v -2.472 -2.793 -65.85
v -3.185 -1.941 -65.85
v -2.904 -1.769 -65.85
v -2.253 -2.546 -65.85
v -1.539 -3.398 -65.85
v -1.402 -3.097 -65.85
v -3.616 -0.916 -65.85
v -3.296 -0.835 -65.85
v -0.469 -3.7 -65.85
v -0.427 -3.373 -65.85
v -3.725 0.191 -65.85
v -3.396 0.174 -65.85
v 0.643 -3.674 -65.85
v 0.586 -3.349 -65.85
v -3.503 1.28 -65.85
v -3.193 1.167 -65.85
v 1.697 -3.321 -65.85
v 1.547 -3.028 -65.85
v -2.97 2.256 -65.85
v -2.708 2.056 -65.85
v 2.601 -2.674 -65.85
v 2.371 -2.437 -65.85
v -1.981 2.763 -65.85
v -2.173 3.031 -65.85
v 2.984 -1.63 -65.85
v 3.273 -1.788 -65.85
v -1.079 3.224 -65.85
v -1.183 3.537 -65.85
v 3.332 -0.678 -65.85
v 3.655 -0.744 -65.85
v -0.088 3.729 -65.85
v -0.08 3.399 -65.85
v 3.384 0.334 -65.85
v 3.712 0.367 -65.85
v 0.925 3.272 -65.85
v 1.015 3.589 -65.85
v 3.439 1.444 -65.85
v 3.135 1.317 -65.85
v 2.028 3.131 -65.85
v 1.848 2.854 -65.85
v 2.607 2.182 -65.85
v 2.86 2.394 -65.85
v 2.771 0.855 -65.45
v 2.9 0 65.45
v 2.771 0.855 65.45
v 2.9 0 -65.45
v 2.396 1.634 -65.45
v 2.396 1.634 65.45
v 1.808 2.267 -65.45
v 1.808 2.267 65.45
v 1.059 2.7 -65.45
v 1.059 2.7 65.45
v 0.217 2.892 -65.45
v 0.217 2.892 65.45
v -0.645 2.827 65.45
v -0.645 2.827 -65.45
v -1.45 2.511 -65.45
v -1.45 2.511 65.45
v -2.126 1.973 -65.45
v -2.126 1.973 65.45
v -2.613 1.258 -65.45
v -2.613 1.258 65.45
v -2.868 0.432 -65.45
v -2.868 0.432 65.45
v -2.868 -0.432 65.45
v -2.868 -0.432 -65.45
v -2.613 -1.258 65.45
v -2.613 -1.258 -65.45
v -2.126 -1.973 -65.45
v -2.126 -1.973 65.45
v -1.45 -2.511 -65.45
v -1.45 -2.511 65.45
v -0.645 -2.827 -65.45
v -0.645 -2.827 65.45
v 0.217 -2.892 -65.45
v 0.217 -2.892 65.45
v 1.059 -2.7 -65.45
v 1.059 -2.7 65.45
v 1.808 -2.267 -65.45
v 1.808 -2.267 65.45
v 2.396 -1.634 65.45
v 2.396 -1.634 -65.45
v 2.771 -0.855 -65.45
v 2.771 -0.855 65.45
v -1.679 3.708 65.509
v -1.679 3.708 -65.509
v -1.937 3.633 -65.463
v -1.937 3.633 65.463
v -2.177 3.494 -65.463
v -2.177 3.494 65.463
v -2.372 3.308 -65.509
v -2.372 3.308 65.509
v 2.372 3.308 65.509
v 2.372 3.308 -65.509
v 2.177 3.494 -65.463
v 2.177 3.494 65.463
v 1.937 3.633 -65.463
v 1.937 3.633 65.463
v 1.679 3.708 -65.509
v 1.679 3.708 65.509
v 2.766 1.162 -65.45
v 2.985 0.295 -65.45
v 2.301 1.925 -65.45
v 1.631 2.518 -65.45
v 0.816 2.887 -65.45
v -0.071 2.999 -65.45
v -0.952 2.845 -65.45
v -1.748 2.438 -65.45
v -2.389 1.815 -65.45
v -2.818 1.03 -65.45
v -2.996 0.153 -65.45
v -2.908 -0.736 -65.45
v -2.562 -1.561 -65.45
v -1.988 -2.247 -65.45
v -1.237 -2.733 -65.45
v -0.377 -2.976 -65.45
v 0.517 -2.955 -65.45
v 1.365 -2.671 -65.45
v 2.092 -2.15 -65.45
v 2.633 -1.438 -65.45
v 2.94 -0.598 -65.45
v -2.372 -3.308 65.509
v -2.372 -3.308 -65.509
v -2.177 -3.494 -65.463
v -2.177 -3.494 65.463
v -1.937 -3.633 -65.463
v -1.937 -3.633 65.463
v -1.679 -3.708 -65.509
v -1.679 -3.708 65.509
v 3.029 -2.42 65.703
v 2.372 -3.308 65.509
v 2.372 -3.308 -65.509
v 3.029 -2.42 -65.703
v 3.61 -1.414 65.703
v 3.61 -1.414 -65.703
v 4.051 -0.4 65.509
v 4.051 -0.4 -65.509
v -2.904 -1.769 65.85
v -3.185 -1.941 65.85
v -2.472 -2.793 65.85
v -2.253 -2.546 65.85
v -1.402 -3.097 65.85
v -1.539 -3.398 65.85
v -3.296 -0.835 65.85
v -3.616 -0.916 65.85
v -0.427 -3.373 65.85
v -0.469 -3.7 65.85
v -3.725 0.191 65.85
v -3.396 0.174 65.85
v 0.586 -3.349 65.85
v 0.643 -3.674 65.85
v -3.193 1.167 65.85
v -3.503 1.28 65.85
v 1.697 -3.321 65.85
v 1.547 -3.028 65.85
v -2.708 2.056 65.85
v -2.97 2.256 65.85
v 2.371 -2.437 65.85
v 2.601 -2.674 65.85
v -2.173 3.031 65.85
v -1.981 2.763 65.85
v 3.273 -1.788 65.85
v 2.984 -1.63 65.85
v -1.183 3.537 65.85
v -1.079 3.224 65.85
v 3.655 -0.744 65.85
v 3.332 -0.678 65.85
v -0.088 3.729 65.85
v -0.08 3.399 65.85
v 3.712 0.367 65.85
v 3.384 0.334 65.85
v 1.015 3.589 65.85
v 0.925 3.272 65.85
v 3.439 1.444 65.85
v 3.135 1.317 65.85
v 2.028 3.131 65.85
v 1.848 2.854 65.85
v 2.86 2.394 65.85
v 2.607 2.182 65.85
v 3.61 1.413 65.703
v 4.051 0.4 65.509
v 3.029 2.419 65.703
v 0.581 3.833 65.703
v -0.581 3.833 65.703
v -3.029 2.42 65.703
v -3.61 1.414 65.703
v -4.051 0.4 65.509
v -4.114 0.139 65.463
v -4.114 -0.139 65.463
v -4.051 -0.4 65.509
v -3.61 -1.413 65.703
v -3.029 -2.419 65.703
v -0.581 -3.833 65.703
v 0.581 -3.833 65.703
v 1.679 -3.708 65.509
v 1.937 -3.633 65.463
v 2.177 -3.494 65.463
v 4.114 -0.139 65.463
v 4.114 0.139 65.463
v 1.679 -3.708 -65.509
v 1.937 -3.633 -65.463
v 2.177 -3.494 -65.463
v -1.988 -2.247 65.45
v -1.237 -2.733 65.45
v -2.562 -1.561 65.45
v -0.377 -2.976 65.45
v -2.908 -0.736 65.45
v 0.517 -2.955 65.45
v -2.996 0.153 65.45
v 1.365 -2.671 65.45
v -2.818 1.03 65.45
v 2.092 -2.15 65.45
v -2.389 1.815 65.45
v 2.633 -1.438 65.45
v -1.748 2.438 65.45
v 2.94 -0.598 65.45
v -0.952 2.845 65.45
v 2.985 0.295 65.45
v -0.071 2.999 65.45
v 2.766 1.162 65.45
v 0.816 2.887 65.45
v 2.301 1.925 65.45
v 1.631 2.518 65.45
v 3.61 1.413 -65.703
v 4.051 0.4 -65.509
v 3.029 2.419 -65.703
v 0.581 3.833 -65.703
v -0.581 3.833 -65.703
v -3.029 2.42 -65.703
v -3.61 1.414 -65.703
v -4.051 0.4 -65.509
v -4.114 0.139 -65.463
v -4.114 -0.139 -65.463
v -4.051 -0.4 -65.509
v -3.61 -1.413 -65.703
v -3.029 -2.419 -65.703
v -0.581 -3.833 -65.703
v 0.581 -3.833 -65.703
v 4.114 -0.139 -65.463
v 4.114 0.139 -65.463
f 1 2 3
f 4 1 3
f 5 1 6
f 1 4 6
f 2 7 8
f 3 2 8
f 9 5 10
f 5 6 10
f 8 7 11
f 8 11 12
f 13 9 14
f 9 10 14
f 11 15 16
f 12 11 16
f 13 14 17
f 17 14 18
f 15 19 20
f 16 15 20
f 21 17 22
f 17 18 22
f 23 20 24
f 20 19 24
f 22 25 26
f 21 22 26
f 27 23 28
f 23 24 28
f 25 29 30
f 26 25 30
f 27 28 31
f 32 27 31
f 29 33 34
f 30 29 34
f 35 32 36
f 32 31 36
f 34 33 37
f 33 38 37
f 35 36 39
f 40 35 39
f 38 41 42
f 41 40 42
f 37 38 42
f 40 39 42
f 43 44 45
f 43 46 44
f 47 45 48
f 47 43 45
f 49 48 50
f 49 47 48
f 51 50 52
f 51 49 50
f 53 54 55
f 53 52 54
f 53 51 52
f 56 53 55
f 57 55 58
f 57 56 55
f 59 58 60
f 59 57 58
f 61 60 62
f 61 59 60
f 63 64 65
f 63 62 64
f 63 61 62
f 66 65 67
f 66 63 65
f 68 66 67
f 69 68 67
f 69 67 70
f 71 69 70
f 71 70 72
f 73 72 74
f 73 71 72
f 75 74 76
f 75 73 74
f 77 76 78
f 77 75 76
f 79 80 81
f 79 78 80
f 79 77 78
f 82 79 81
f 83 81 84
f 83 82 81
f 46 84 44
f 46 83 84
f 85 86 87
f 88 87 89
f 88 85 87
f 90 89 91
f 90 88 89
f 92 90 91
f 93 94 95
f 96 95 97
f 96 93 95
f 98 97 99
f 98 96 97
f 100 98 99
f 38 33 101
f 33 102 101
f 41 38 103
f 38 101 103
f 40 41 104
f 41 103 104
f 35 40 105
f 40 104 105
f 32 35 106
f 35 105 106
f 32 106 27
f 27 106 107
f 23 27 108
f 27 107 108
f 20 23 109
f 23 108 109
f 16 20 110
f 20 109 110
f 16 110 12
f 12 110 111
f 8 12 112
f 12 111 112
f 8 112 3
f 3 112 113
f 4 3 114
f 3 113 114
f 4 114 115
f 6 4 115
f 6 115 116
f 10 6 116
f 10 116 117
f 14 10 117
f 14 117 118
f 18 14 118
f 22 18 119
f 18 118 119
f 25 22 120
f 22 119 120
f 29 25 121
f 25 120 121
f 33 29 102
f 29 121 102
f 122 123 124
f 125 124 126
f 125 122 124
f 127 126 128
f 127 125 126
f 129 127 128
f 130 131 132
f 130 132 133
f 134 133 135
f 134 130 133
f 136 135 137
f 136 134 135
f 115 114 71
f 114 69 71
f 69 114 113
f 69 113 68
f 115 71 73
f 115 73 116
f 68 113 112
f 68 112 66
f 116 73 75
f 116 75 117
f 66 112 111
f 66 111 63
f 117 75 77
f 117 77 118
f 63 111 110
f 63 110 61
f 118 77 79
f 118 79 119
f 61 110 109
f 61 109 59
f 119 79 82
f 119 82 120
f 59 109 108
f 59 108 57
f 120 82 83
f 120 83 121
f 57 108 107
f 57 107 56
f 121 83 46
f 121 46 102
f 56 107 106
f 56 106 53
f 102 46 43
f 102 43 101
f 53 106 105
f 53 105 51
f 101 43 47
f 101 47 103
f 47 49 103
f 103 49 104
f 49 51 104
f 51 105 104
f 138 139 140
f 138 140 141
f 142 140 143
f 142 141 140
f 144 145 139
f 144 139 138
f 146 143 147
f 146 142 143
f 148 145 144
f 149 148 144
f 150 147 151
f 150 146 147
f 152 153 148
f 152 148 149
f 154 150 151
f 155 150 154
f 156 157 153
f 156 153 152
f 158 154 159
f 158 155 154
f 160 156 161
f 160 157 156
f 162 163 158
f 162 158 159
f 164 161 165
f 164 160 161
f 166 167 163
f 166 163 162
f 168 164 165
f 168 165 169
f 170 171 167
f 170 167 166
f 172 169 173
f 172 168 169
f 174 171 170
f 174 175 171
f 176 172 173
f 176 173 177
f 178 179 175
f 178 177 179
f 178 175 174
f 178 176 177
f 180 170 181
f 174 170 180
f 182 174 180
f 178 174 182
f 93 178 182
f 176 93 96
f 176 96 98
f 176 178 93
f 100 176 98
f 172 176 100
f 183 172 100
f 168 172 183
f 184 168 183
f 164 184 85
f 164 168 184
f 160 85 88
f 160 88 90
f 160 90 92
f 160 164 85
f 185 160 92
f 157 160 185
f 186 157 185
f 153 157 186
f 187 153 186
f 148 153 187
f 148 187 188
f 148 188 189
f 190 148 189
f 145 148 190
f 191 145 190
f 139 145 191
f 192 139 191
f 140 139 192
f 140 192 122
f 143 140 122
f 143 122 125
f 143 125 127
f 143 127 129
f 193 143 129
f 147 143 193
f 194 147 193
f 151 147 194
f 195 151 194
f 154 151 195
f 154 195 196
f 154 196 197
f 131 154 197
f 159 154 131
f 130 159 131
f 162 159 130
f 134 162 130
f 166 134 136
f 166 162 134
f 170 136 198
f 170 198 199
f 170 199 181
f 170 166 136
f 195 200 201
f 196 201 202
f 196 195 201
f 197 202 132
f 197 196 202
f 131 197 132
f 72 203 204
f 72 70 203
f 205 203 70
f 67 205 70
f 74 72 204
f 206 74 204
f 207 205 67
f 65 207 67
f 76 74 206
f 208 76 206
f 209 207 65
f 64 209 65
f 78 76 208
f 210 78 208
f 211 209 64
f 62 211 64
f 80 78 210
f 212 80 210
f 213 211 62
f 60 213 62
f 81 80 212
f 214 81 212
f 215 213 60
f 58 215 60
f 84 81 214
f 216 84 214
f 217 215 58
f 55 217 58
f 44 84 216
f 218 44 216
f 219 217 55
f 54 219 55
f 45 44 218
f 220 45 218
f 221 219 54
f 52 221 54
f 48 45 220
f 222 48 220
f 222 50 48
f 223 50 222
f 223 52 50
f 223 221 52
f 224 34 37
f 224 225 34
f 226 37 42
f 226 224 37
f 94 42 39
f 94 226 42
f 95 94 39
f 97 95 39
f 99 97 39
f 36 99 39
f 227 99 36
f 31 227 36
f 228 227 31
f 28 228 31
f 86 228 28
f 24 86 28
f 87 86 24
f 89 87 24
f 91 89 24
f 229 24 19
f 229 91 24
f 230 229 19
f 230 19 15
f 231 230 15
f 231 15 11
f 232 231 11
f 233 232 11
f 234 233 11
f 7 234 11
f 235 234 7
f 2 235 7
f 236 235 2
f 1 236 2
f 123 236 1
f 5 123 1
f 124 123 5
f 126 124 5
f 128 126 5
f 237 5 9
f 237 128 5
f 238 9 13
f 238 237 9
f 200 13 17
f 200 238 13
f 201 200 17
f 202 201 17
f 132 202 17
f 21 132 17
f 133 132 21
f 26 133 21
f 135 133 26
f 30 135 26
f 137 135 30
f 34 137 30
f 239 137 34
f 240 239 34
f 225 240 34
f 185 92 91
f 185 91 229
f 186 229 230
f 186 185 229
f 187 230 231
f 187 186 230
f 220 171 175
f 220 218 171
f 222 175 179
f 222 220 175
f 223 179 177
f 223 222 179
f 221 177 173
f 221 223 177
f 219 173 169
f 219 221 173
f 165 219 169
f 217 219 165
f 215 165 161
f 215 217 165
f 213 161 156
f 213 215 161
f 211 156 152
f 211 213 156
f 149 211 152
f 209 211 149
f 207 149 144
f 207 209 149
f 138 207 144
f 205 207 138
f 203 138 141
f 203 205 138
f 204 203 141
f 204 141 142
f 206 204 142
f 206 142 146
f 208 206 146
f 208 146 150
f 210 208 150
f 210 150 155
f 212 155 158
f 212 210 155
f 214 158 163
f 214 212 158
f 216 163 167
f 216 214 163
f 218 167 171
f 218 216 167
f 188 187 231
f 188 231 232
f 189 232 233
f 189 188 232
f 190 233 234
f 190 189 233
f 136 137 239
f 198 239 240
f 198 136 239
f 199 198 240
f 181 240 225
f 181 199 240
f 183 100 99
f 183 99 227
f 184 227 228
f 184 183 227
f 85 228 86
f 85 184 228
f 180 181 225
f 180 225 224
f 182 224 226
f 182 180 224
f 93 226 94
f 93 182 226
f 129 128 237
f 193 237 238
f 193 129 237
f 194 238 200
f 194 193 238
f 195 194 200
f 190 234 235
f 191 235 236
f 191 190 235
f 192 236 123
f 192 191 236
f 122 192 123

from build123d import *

# Parameters (mm, degrees)
ESBO_O3_R       = 2.9
EXTRUS_O2_DEPTH = 65.85


with BuildPart() as part:
    # Esboço3 → Extrusão2 (new, symmetric)
    with BuildSketch(Plane.XY):
        with BuildLine():
            ThreePointArc((-1.679123513, 3.708327237), (-2.061437209, 3.570513982), (-2.371943836, 3.308327237))
            ThreePointArc((-2.371943836, 3.308327237), (-3.334197805, 1.925), (-4.05106735, 0.4))
            ThreePointArc((-4.05106735, 0.4), (-4.122874417, 0), (-4.05106735, -0.4))
            ThreePointArc((-4.05106735, -0.4), (-3.334197805, -1.925), (-2.371943836, -3.308327237))
            ThreePointArc((-2.371943836, -3.308327237), (-2.061437209, -3.570513982), (-1.679123513, -3.708327237))
            ThreePointArc((-1.679123513, -3.708327237), (0, -3.85), (1.679123513, -3.708327237))
            ThreePointArc((1.679123513, -3.708327237), (2.061437209, -3.570513982), (2.371943836, -3.308327237))
            ThreePointArc((2.371943836, -3.308327237), (3.334197805, -1.925), (4.05106735, -0.4))
            ThreePointArc((4.05106735, -0.4), (4.122874417, 0), (4.05106735, 0.4))
            ThreePointArc((4.05106735, 0.4), (3.334197805, 1.925), (2.371943836, 3.308327237))
            ThreePointArc((2.371943836, 3.308327237), (2.061437209, 3.570513982), (1.679123513, 3.708327237))
            ThreePointArc((1.679123513, 3.708327237), (0, 3.85), (-1.679123513, 3.708327237))
        make_face()
        Circle(ESBO_O3_R, mode=Mode.SUBTRACT)
    extrude(amount=EXTRUS_O2_DEPTH, both=True)

    # Esboço5 → Corte-Revolução2 (revolve, cut)
    with BuildSketch(Plane(origin=(0, 0, 0), x_dir=(0, 0, -1), z_dir=(1, 0, 0))):
        Polygon((65.85, 3.73), (65.124884733, 4.455115267), (66.124884733, 4.455115267), (66.124884733, 3.73), align=None)
        Polygon((65.85, 3.4), (65.45, 3), (65.45, 2.769529571), (65.85, 2.769529571), align=None)
        Polygon((-65.85, 3.73), (-66.124884733, 3.73), (-66.124884733, 4.455115267), (-65.124884733, 4.455115267), align=None)
    corte_revolu_o2 = revolve(axis=Axis((0, 0, -65.739939352), (0, 0, 1)), mode=Mode.SUBTRACT)

    # Espelhar1: Corte-Revolução2 across plane
    add(corte_revolu_o2.mirror(Plane.XY), mode=Mode.SUBTRACT)


solid = part.part
